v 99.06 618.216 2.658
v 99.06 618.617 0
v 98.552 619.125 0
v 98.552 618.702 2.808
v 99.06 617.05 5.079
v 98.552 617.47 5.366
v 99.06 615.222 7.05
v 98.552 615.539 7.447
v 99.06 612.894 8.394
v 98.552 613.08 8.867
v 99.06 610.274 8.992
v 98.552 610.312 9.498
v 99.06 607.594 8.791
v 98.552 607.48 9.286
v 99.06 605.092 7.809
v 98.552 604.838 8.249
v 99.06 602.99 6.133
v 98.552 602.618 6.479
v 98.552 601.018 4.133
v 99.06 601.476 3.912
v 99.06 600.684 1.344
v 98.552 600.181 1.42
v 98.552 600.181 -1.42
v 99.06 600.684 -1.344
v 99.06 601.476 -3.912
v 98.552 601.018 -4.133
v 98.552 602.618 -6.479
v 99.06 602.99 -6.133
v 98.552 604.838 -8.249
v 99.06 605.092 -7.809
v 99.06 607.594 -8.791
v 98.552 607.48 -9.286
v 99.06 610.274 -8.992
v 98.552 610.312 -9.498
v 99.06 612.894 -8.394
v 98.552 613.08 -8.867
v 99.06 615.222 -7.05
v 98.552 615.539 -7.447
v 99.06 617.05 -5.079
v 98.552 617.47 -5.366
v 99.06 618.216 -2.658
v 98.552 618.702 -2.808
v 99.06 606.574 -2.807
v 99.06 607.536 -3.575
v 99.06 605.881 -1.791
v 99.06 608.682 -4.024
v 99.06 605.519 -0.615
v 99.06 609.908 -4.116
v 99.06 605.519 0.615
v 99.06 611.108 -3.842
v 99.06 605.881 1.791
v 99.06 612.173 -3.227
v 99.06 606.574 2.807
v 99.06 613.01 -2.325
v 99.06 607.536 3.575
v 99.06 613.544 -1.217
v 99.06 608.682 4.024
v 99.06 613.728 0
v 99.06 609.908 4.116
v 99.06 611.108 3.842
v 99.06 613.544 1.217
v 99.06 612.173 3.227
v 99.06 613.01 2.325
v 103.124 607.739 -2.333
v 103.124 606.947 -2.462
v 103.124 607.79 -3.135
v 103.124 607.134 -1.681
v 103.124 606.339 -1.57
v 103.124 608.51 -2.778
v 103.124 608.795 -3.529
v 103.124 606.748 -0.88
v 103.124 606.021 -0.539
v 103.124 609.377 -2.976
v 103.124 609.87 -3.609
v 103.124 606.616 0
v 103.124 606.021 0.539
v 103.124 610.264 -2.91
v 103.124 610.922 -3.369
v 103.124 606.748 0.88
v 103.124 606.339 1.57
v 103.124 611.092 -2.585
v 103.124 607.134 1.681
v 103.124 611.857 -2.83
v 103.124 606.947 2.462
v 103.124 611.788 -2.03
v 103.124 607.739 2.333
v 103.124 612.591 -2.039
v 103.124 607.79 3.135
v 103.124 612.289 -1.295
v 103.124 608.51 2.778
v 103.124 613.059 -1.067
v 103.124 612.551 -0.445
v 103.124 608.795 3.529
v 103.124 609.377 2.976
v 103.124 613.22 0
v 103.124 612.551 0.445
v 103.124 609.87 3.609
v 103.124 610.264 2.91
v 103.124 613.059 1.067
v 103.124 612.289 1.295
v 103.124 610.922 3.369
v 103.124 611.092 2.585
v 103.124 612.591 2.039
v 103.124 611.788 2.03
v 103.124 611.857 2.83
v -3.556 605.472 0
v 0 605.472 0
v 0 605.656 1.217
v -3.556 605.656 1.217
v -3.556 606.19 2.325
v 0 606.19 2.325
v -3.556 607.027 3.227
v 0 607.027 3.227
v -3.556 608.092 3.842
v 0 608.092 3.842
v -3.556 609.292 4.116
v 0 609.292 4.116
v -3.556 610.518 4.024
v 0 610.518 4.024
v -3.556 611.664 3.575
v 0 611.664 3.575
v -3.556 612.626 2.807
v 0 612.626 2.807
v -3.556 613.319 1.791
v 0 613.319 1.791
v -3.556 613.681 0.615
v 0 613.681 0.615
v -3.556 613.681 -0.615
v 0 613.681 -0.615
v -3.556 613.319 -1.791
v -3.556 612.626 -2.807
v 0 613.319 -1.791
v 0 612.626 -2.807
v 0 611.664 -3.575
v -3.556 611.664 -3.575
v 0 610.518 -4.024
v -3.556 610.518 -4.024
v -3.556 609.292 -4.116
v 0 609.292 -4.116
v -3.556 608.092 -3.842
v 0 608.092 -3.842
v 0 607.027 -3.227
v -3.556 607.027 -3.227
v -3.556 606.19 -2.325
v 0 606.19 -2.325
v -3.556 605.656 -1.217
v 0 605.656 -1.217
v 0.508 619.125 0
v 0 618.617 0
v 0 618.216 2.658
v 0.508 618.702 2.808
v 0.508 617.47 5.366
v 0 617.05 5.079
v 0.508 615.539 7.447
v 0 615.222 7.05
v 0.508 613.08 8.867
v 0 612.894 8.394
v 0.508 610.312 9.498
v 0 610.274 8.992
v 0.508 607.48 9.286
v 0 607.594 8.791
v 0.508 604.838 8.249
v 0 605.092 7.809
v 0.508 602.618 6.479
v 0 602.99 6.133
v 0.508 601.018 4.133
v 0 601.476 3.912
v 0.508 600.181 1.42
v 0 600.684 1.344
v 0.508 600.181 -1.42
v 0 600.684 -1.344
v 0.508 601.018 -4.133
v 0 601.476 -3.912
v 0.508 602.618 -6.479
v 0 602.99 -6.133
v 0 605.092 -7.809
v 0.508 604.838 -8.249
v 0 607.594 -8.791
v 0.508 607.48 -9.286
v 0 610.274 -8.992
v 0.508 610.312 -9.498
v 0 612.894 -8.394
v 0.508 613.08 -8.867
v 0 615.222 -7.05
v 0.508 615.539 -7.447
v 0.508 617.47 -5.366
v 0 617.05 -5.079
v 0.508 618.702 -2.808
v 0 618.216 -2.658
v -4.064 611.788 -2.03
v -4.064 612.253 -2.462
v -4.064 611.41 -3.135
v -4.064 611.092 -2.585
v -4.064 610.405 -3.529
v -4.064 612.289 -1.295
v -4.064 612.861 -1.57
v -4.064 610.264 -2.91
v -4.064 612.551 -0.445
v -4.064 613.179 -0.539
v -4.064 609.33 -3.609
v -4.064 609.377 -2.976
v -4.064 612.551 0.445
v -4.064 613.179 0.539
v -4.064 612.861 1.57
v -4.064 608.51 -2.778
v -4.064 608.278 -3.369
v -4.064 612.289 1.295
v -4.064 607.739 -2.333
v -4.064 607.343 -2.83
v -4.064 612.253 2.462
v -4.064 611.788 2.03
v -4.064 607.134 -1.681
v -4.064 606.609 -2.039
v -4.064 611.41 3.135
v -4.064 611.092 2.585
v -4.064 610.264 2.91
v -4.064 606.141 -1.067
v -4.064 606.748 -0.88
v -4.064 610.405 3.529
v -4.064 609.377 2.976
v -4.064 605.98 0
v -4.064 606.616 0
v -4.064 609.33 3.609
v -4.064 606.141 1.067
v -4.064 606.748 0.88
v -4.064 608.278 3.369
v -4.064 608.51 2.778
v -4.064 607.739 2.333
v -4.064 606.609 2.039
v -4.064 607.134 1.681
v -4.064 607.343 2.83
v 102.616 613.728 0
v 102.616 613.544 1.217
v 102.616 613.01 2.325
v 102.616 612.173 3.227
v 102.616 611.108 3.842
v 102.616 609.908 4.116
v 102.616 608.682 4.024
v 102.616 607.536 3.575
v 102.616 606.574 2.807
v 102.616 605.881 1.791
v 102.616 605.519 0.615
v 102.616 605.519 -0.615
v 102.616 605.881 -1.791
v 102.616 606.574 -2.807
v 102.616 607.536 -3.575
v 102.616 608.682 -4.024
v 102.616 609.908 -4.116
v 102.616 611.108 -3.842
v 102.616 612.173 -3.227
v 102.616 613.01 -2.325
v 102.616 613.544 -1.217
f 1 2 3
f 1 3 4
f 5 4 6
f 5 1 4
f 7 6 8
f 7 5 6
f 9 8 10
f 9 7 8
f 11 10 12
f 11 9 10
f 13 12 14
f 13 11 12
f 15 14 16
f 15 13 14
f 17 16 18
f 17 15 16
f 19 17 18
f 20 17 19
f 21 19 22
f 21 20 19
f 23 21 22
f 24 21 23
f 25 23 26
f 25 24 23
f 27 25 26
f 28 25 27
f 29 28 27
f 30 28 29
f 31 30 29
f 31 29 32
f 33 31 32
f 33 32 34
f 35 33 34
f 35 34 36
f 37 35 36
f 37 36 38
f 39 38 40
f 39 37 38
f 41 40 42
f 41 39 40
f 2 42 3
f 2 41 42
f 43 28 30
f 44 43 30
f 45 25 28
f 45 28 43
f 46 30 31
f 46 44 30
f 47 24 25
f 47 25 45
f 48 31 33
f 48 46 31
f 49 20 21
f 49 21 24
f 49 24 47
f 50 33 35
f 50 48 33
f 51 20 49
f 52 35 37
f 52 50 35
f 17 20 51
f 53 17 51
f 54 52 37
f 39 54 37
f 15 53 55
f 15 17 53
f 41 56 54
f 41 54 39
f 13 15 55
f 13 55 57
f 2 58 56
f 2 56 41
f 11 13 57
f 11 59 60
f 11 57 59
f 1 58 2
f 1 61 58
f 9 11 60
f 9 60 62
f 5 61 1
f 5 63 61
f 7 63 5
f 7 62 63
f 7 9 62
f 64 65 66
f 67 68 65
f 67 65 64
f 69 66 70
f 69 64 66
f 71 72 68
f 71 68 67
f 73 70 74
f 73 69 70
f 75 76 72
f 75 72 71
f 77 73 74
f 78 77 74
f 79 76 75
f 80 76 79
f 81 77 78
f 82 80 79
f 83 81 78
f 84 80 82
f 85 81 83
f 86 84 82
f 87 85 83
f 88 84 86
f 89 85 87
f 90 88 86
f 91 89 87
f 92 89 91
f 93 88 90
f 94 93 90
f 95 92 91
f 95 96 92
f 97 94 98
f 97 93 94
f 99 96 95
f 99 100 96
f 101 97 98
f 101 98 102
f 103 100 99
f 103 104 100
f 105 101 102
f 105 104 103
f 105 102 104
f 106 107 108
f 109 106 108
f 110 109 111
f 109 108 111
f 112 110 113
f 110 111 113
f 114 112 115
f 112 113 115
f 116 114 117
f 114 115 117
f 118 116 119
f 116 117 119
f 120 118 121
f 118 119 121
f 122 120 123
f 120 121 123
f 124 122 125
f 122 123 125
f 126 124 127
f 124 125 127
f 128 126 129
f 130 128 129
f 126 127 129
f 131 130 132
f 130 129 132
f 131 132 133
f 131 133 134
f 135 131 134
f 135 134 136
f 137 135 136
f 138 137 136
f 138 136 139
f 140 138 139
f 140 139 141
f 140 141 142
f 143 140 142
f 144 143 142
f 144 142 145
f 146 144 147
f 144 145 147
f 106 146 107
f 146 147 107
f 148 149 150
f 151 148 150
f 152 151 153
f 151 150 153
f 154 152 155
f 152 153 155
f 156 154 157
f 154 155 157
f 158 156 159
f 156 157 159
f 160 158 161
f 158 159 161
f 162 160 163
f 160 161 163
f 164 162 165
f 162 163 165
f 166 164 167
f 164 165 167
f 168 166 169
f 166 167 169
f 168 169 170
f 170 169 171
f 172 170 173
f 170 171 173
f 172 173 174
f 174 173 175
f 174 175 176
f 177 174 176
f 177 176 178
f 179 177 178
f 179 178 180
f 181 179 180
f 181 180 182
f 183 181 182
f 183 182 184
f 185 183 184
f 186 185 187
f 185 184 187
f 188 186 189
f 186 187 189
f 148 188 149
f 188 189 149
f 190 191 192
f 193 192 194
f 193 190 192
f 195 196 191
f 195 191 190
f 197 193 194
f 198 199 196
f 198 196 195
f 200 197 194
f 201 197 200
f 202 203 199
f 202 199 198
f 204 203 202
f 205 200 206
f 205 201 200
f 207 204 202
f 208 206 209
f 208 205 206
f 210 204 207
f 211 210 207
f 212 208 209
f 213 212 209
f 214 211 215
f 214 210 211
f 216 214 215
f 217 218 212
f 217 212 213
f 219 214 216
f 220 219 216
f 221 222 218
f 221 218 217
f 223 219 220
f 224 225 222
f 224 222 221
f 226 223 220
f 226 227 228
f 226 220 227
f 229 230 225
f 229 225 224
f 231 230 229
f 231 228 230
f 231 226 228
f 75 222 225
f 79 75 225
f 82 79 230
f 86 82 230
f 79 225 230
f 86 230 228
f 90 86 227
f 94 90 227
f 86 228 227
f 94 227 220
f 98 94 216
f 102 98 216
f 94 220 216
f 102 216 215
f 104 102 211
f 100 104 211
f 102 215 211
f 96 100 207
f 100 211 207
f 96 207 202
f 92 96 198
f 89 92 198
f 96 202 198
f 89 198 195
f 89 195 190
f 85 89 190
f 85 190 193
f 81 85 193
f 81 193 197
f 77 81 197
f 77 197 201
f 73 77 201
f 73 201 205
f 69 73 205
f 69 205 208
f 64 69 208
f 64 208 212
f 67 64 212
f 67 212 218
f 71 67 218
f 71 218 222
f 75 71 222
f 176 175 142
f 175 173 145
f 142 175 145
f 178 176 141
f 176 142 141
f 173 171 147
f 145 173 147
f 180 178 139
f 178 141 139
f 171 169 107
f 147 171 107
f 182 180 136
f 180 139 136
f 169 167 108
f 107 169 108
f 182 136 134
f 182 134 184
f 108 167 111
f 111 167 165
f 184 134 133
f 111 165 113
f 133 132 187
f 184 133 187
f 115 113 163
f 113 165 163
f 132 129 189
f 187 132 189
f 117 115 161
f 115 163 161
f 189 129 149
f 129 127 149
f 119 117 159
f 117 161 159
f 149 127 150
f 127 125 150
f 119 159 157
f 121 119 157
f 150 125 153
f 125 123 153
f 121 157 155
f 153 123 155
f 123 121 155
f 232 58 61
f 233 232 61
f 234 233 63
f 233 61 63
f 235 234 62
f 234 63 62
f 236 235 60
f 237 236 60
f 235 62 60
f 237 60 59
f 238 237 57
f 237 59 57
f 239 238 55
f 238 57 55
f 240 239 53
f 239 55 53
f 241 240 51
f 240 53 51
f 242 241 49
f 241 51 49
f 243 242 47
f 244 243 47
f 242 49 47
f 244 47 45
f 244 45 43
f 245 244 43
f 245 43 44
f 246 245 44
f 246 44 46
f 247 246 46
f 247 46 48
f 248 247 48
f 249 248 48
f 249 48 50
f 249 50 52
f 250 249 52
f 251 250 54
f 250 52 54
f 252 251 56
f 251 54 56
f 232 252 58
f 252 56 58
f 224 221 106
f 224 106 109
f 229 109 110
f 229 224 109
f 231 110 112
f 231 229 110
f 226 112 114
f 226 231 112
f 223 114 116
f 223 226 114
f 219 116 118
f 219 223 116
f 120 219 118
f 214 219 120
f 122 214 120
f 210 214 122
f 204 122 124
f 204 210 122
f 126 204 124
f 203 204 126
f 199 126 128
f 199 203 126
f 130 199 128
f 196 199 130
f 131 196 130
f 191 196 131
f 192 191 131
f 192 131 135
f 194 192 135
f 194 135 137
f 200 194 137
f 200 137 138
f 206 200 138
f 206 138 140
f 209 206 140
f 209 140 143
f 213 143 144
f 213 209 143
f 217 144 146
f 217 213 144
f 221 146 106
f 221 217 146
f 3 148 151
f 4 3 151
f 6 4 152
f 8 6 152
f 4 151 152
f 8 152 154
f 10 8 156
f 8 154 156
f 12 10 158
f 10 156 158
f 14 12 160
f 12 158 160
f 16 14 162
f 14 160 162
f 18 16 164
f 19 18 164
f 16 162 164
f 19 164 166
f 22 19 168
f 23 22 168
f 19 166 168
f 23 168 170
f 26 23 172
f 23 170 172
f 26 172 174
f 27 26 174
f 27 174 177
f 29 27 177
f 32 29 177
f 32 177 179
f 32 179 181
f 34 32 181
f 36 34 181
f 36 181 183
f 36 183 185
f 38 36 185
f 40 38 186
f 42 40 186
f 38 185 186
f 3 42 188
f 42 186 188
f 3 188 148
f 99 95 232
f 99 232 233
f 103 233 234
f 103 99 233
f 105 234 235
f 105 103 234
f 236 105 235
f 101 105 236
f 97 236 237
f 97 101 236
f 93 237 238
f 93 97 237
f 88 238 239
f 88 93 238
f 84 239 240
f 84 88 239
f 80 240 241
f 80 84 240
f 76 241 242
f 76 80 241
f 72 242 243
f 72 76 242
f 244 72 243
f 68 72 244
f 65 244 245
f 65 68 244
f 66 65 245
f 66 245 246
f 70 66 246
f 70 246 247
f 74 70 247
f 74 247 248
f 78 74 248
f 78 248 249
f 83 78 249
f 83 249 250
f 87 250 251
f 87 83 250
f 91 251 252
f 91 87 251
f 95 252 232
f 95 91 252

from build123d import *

# Parameters (mm, degrees)
F0_R     = 9.525
F6_DEPTH = 99.06
F7_R     = 4.1275
F1_DEPTH = 4.064
F3_R     = 4.1275
F8_DEPTH = 4.064
F4_R     = 2.9845
F9_DEPTH = 107.189
F5_SIZE  = 0.508


with BuildPart() as f6:
    # F0 (on Right) → F6 (new body)
    with BuildSketch(Plane.YZ):
        with Locations((609.6, 0)):
            Circle(F0_R)
    extrude(amount=F6_DEPTH)

    # F7 (on face) → F1 (join)
    with BuildSketch(Plane.YZ.offset(99.06)):
        with Locations((609.6, 0)):
            Circle(F7_R)
    extrude(amount=F1_DEPTH)

    # F3 (on face) → F8 (join)
    with BuildSketch(Plane(origin=(0, 0, 0), x_dir=(0, -1, 0), z_dir=(-1, 0, 0))):
        with Locations((-609.6, 0)):
            Circle(F3_R)
    extrude(amount=F8_DEPTH)

    # F4 (on face) → F9 (cut, through all)
    with BuildSketch(Plane(origin=(-4.064, 0, 0), x_dir=(0, -1, 0), z_dir=(-1, 0, 0))):
        with Locations((-609.6, 0)):
            Circle(F4_R)
    extrude(amount=-F9_DEPTH, mode=Mode.SUBTRACT)

    # F5
    f5_edges = [f6.edges().sort_by_distance(p)[0] for p in [
        (99.06, 600.075, 0),
        (0, 600.075, 0),
        (-4.064, 613.7275, 0),
        (103.124, 605.4725, 0),
    ]]
    chamfer(f5_edges, length=F5_SIZE)


solid = f6.part
